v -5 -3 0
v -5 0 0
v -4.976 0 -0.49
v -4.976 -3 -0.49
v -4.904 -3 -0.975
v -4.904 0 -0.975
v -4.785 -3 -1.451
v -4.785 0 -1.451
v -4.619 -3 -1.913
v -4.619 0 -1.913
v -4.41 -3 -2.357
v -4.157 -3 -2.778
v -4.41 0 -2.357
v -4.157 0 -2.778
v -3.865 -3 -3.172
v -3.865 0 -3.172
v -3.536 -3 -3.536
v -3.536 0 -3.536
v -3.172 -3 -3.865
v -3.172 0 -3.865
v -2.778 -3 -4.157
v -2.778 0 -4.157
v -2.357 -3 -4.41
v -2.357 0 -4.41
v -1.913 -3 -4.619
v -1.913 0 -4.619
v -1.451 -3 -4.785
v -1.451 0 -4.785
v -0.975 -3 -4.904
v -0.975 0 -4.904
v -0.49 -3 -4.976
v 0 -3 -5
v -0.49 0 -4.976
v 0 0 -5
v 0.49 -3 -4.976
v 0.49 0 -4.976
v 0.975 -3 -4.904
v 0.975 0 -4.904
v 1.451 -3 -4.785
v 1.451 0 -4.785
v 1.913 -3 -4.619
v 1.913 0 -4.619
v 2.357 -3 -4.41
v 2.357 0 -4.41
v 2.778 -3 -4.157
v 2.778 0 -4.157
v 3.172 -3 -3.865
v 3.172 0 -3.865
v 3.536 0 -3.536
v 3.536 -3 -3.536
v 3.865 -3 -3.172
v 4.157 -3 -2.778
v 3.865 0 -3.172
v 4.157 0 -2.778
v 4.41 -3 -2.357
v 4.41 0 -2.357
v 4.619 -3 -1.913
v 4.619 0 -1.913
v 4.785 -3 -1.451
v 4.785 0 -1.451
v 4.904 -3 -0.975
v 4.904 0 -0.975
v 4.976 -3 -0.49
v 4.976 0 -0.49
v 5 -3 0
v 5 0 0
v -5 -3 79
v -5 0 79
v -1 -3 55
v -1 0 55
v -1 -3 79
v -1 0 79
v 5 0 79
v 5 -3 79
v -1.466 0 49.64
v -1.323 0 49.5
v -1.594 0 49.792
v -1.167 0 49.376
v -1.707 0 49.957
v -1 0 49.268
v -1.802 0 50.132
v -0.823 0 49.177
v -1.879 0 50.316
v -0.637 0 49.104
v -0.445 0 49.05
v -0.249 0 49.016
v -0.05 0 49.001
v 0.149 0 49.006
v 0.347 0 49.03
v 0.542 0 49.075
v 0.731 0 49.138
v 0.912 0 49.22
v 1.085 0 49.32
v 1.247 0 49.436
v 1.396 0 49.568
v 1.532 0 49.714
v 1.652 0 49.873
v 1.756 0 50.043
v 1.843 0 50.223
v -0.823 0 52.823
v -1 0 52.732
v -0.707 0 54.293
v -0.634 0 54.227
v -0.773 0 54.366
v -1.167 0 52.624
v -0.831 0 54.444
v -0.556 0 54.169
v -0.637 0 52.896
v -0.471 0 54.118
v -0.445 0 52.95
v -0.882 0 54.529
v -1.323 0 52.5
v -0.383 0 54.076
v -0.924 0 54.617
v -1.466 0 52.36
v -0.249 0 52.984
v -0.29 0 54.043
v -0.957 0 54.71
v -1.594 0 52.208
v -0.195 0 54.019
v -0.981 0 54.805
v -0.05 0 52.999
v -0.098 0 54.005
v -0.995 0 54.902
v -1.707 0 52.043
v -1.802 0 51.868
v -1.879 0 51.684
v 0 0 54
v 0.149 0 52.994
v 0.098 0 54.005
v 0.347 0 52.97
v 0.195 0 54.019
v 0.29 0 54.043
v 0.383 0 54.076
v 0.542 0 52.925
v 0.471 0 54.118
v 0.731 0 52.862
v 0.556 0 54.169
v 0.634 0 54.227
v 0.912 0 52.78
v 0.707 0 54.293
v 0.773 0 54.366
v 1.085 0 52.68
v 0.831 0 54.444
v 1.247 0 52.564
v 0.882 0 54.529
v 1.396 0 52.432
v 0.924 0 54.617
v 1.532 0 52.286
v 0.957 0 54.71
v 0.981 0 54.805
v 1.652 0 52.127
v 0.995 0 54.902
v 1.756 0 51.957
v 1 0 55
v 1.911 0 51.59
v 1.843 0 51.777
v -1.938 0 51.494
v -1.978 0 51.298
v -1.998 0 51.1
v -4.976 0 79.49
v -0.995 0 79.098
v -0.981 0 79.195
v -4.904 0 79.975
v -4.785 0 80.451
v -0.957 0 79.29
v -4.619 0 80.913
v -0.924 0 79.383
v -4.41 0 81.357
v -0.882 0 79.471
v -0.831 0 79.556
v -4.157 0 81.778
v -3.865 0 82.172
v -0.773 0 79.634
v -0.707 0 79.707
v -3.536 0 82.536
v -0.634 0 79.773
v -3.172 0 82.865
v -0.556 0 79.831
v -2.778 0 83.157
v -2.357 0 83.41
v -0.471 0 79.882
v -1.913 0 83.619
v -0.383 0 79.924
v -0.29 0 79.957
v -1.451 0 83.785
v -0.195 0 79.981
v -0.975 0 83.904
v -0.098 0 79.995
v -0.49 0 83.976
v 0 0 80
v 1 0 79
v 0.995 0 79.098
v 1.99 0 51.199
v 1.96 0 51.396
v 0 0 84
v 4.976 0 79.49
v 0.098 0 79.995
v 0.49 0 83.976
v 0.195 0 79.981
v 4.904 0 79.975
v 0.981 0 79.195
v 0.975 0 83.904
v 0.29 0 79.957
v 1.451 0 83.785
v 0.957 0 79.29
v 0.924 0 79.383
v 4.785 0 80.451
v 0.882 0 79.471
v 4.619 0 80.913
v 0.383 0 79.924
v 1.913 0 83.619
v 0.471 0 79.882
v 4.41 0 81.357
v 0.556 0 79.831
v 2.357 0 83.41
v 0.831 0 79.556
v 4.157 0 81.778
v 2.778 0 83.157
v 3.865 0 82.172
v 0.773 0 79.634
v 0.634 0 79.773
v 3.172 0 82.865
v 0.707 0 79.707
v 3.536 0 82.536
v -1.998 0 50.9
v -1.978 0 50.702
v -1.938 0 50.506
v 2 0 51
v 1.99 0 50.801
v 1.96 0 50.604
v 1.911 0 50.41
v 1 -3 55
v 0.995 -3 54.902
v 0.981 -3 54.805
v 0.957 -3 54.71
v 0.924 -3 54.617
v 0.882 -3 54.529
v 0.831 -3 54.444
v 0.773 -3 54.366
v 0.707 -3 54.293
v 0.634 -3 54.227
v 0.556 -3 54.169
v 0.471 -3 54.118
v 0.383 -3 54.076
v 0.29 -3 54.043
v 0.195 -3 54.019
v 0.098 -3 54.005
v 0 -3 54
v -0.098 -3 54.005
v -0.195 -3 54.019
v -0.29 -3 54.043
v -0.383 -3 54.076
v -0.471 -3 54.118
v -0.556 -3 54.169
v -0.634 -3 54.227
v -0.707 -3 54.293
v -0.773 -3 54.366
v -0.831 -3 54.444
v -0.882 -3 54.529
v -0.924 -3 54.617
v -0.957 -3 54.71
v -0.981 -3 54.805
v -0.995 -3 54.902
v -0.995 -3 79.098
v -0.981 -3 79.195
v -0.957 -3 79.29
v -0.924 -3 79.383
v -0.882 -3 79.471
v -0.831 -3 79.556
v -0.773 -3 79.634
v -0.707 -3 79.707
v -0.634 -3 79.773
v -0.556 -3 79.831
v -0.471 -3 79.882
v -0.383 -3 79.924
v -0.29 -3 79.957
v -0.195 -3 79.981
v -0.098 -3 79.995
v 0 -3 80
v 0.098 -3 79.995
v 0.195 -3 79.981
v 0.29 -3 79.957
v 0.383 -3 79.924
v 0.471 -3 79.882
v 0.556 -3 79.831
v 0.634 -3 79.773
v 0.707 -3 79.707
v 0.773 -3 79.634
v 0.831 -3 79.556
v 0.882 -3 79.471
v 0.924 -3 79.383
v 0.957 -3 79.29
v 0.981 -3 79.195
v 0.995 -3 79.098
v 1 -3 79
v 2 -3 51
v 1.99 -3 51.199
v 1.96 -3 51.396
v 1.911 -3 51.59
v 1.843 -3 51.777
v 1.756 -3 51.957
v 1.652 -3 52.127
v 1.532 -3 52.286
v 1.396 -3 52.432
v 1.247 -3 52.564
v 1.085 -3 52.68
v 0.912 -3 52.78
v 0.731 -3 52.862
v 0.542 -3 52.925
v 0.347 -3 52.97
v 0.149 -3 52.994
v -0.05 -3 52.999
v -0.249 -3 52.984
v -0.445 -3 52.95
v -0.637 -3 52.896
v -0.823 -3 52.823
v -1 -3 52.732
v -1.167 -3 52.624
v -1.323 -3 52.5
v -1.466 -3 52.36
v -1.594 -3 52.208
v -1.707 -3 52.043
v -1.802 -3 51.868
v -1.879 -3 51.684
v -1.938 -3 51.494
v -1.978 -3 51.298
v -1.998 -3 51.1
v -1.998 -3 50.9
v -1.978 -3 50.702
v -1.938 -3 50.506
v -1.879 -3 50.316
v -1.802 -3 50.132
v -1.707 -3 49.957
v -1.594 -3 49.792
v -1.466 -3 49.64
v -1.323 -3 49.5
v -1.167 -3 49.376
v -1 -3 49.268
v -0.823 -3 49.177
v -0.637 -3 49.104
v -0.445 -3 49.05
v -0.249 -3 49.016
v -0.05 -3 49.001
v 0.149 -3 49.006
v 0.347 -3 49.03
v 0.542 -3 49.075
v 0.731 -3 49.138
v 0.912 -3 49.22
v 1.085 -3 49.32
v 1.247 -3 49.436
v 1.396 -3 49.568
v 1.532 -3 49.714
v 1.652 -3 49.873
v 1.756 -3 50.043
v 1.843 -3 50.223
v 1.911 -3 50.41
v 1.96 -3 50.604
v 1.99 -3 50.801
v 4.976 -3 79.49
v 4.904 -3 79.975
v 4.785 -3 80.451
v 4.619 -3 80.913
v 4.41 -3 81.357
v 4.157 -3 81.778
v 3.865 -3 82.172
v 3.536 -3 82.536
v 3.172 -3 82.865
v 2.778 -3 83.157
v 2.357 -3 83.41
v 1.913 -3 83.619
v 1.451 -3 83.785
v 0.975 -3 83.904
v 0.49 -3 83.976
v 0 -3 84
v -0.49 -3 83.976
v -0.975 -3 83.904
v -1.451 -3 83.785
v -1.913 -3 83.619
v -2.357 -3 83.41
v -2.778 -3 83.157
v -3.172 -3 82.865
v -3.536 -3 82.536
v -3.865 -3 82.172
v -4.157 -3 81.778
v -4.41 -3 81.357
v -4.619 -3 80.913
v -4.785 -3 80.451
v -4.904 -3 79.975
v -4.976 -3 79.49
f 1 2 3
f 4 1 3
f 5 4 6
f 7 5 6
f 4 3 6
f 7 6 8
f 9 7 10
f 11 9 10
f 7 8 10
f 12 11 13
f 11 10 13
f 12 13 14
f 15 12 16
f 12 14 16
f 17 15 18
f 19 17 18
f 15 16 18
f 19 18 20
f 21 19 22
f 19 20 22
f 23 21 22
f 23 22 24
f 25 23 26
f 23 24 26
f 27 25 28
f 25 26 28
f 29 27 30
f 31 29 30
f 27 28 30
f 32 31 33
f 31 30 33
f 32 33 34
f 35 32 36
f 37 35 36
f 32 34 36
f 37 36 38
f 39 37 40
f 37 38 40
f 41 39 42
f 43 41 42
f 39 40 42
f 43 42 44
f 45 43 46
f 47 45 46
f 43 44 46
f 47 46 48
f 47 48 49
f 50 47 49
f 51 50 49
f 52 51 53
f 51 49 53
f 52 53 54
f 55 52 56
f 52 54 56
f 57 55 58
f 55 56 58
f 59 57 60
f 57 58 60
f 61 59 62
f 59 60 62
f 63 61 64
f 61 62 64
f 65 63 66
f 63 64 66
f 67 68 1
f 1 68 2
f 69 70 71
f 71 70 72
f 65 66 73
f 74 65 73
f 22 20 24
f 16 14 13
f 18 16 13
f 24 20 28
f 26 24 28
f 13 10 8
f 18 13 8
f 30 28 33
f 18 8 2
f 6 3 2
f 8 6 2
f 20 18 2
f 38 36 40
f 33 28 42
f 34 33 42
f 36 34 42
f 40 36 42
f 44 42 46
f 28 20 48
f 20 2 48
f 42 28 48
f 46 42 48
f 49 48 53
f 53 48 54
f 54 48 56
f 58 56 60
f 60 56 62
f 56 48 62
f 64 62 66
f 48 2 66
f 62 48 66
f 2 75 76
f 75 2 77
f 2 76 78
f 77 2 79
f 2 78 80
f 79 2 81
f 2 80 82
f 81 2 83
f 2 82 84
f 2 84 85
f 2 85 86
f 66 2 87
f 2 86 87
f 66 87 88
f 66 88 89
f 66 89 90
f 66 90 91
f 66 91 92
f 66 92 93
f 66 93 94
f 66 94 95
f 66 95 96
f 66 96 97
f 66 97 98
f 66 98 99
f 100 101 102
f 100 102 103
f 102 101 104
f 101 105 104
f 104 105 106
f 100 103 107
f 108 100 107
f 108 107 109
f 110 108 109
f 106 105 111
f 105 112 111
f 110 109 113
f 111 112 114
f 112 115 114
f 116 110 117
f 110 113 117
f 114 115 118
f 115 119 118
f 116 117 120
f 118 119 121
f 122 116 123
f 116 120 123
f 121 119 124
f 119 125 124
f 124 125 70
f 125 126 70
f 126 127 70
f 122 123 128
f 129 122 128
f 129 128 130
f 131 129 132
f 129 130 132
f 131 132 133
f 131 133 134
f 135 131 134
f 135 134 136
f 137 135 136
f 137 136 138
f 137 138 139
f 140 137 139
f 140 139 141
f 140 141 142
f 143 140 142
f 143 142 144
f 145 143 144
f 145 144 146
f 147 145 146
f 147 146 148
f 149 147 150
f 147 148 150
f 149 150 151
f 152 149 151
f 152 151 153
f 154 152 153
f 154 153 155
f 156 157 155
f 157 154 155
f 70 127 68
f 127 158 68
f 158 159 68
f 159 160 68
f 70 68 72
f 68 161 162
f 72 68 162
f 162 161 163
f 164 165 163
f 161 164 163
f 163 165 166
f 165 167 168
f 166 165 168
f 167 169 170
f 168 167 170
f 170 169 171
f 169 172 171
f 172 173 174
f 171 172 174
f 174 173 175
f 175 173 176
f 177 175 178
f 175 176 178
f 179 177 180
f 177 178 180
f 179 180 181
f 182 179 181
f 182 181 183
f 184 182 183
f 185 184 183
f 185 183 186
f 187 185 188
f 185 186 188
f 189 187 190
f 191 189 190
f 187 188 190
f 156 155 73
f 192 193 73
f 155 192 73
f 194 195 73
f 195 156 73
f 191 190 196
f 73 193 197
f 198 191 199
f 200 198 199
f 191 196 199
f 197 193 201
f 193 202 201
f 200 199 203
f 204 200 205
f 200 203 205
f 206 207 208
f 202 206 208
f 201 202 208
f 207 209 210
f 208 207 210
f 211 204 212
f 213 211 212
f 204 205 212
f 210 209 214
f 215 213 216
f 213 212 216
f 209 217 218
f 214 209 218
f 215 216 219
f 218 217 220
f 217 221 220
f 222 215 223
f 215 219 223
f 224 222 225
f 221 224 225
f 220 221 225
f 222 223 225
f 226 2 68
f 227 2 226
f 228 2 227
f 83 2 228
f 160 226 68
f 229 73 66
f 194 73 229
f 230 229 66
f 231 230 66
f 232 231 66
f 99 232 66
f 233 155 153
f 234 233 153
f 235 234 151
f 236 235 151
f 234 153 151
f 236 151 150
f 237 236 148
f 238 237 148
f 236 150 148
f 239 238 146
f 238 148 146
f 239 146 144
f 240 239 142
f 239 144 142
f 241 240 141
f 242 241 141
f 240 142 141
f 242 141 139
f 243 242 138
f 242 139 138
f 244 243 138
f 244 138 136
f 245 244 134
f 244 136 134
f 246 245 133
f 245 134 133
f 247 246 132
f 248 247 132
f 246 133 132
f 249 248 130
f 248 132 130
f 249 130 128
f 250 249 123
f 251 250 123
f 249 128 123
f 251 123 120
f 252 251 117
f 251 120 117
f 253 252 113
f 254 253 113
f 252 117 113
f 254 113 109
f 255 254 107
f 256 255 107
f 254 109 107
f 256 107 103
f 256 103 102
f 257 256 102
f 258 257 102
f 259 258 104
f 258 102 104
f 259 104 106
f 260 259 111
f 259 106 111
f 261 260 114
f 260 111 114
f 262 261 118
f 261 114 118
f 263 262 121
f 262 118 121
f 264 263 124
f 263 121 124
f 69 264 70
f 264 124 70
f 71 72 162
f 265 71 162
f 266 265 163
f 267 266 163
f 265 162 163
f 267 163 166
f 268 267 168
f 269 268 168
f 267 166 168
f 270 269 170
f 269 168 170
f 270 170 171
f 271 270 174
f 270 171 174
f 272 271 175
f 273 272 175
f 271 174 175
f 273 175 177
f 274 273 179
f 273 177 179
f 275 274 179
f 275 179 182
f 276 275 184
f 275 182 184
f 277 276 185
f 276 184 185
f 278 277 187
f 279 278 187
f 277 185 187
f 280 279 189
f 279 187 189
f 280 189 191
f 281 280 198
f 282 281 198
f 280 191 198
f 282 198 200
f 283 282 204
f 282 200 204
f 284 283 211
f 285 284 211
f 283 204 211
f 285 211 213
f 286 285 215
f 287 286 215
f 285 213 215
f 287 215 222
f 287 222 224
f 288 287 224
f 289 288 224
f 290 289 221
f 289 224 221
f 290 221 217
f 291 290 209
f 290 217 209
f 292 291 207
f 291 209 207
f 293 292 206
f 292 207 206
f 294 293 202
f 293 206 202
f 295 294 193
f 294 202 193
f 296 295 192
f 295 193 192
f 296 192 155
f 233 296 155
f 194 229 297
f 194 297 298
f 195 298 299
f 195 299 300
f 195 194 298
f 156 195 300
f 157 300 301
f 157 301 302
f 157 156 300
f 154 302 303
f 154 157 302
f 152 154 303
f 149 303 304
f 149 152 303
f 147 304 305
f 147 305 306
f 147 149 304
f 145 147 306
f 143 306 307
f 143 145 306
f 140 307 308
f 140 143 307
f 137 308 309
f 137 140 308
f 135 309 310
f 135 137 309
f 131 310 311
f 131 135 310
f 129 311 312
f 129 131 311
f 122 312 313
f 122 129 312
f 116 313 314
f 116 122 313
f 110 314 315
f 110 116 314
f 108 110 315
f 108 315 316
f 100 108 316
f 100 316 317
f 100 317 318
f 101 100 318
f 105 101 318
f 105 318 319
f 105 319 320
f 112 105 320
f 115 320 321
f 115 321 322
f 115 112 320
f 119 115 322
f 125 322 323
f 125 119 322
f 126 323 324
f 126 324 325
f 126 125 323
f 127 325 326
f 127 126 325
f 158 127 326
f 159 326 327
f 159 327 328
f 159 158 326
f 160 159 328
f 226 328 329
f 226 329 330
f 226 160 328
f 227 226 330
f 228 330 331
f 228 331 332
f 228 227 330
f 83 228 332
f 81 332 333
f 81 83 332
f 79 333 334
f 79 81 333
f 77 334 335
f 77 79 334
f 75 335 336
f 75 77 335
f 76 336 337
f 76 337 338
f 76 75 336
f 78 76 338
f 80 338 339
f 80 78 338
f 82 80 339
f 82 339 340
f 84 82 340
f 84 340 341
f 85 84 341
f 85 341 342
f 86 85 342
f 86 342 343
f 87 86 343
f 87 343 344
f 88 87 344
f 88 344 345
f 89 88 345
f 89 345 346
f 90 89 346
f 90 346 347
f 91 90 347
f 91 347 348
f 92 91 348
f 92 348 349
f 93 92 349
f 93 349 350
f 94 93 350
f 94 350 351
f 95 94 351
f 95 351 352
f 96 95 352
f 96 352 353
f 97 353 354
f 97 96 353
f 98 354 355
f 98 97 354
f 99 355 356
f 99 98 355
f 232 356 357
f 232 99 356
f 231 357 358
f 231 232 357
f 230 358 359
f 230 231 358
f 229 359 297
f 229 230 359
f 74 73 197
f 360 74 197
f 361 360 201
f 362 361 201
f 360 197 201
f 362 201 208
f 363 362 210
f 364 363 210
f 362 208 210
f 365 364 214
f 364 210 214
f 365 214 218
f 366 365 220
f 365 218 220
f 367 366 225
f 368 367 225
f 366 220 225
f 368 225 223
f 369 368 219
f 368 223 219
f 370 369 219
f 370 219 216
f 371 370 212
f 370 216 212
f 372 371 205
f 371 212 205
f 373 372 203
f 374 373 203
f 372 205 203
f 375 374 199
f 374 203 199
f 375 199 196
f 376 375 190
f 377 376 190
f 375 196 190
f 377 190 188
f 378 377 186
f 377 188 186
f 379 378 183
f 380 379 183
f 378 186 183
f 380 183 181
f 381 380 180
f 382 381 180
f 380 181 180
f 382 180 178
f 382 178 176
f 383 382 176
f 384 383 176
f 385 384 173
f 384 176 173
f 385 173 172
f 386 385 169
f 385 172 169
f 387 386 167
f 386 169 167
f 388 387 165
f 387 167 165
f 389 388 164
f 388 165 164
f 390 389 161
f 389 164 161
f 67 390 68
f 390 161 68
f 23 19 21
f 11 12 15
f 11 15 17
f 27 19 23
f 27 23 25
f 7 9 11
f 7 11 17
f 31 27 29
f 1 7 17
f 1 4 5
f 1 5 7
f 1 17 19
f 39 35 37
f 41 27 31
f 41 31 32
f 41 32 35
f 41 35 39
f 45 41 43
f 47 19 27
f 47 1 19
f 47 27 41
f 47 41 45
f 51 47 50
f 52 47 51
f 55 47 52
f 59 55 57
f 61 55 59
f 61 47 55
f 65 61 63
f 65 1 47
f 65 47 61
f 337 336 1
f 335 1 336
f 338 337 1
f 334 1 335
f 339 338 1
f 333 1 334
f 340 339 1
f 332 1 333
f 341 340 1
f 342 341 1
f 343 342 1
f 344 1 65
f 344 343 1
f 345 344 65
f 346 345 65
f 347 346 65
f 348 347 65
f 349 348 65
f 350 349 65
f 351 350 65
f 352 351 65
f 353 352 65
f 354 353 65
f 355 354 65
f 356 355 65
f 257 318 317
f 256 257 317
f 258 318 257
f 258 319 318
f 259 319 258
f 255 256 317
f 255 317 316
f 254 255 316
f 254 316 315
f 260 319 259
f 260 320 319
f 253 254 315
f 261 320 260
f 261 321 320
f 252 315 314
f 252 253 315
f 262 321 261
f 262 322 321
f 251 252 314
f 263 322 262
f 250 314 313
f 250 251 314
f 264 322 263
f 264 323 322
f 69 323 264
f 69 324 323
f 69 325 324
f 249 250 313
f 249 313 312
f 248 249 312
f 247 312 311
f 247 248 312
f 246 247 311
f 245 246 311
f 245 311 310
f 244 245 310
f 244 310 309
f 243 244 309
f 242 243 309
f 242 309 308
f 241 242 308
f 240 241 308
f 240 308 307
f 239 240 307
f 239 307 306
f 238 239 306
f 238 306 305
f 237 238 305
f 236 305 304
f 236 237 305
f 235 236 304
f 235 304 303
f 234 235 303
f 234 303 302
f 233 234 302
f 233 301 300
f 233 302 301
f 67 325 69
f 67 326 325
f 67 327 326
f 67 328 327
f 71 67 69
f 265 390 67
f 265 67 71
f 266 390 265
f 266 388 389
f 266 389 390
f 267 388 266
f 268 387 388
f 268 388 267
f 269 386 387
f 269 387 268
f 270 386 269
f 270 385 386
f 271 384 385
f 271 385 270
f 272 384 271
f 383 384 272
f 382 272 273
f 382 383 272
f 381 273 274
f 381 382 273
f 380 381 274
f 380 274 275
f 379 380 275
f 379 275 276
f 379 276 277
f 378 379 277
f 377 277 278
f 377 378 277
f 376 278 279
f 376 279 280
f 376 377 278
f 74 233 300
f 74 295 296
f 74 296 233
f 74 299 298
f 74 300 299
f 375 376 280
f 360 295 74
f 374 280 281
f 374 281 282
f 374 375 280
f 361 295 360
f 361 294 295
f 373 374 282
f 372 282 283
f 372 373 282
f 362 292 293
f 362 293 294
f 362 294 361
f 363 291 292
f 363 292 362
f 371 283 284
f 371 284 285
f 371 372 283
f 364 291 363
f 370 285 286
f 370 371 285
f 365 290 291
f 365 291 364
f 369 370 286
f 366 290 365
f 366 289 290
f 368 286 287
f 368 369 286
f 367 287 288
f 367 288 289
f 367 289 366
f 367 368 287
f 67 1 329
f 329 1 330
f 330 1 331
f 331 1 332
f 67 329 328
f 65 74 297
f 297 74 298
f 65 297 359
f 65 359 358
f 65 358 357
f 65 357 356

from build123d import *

# Parameters (mm, degrees)
F0_R     = 2
F1_DEPTH = 3


with BuildPart() as f1:
    # F0 (on Front) → F1 (new body)
    with BuildSketch(Plane.XZ):
        with BuildLine():
            Line((-5, 79), (-5, 0))
            ThreePointArc((-5, 0), (0, -5), (5, 0))
            Line((5, 0), (5, 79))
            ThreePointArc((5, 79), (0, 84), (-5, 79))
        make_face()
        with Locations((0, 51)):
            Circle(F0_R, mode=Mode.SUBTRACT)
        with BuildLine():
            ThreePointArc((-1, 79), (0, 80), (1, 79))
            Line((1, 79), (1, 55))
            ThreePointArc((1, 55), (0, 54), (-1, 55))
            Line((-1, 55), (-1, 79))
        make_face(mode=Mode.SUBTRACT)
    extrude(amount=F1_DEPTH)


solid = f1.part
